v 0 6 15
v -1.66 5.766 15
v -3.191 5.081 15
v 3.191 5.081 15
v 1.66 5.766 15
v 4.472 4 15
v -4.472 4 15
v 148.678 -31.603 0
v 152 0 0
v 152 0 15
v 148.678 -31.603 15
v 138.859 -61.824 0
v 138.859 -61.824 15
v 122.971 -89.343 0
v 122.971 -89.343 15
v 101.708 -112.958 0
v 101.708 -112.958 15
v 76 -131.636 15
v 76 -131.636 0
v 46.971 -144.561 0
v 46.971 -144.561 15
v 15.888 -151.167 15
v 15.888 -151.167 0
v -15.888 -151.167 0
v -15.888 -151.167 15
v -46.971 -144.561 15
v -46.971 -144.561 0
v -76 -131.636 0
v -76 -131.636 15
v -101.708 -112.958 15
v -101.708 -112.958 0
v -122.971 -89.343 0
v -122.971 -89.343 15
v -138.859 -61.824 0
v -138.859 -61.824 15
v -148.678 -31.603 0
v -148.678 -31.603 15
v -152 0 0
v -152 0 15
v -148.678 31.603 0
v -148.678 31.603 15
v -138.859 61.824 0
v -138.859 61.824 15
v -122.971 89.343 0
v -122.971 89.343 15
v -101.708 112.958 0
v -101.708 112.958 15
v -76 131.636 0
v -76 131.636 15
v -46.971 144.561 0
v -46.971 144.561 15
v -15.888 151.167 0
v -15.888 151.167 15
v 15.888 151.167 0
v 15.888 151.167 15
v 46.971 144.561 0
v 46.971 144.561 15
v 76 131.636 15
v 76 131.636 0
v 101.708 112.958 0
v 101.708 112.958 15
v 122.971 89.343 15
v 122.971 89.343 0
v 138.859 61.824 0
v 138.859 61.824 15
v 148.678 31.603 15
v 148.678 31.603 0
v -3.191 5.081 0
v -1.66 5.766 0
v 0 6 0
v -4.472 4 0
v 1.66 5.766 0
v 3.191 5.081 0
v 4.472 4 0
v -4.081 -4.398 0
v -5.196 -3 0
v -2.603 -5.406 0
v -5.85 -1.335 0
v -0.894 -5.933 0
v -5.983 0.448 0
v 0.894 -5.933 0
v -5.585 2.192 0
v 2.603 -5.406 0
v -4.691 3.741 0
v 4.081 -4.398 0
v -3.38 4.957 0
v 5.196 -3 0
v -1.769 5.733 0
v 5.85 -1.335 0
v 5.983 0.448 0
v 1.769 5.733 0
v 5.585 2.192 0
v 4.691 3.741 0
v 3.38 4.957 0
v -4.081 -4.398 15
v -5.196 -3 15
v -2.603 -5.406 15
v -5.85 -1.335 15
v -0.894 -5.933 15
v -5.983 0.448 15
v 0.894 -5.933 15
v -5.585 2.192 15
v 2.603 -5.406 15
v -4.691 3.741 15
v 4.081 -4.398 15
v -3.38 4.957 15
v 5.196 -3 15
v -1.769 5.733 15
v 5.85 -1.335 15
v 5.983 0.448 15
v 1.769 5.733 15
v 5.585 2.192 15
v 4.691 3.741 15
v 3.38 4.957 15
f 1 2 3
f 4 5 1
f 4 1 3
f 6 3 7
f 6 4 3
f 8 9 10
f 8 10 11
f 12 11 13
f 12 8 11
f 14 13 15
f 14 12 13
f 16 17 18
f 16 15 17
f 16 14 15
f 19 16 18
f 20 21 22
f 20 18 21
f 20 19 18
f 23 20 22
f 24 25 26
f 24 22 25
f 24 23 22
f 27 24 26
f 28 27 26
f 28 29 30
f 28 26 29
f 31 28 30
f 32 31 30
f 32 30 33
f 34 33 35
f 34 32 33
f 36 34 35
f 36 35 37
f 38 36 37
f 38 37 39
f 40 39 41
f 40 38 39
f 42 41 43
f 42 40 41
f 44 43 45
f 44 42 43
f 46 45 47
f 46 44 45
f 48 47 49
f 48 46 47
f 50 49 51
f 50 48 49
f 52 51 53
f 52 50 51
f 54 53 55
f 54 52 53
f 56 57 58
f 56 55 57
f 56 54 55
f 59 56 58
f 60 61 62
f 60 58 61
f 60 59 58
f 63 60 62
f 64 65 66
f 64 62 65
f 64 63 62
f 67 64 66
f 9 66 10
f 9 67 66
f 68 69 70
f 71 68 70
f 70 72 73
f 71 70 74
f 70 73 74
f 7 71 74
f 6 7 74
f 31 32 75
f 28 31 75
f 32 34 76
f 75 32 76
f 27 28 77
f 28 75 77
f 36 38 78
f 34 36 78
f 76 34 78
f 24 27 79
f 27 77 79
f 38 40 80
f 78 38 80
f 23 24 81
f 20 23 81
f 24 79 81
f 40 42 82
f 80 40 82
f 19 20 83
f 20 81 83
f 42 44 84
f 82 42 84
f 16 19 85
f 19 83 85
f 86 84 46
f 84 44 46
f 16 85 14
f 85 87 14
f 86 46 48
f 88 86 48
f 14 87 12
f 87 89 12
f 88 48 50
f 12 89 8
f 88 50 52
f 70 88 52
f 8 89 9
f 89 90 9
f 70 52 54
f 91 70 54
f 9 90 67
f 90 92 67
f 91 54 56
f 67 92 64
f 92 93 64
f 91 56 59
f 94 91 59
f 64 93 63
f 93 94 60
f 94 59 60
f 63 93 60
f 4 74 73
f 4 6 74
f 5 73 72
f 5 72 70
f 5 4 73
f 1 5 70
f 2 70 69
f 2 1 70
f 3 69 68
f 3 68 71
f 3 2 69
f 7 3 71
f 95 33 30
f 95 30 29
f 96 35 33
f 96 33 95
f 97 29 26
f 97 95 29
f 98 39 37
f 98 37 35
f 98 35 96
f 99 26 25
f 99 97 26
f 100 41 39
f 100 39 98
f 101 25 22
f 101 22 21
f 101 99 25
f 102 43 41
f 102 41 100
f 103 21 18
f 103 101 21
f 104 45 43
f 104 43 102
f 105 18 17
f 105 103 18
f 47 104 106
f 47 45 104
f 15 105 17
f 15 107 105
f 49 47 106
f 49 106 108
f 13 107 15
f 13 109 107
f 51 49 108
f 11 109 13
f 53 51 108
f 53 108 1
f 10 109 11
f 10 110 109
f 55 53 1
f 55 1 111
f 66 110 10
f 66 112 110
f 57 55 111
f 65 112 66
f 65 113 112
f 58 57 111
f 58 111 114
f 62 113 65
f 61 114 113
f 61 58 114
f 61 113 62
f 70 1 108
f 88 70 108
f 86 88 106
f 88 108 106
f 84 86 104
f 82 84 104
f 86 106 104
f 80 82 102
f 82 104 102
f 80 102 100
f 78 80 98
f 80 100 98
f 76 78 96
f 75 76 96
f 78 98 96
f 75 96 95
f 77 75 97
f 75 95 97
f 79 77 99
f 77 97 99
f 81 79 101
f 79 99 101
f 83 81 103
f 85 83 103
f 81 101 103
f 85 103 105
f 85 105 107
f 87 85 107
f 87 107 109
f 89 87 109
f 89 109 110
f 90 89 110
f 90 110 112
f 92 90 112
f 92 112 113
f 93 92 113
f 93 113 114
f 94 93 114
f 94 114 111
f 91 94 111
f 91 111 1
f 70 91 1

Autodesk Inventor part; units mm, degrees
ref_plane "YZ Plane" through (0, 0, 0) normal (1, 0, 0) x (0, 1, 0)
ref_plane "XZ Plane" through (0, 0, 0) normal (0, 1, 0) x (-1, 0, 0)
ref_plane "XY Plane" through (0, 0, 0) normal (0, 0, 1) x (1, 0, 0)
sketch "スケッチ1" plane through (0, 0, 0) normal (0, 0, 1) x (1, 0, 0)
  circle A0 centre (0, 0) radius 152
  dimension "d0" = 304
extrude "押し出し1" add sketch "スケッチ1" along normal blind 15
sketch "スケッチ2" plane through (0, 0, 0) normal (0, 0, -1) x (-1, 0, 0)
  point P0 (0, 0)
  point P1 (0, 0)
hole "穴1" at (0, 0, 0) direction (0, 0, 1) diameter 12 end through all
sketch "スケッチ3" plane through (0, 0, 0) normal (0, 0, -1) x (-1, 0, 0)
  circle A0 centre (0, 0) radius 6 projected
sketch "スケッチ5" plane through (0, 0, 15) normal (0, 0, 1) x (1, 0, 0)
  arc A0 (4.4721, 4) -> (-4.4721, 4) centre (0, 0) ccw
  line L0 (0, 4) -> (4.4721, 4)
  line L1 (0, 4) -> (-4.4721, 4)
  dimension "d15" = 12
  dimension "d16" = 4
extrude "押し出し3" add sketch "スケッチ5" against normal blind 15
properties part number "計測輪"
